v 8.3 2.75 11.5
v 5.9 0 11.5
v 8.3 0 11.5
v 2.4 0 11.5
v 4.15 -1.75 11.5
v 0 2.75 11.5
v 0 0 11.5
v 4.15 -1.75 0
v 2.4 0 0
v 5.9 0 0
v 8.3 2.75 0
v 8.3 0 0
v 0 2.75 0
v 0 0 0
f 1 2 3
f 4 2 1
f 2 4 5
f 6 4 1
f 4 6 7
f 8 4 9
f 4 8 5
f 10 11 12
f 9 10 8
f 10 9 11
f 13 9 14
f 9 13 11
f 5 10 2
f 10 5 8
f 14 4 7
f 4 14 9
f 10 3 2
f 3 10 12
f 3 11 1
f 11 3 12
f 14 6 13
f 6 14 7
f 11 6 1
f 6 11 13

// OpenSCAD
tubeLength=26;
vDiameter=10;

baseHeight=11.50;
baseWidth=8.30;
baseDepth=2.75;

union(){
    cube([baseWidth, baseDepth, baseHeight]);

    difference() {
        translate([baseWidth/2, -1.75, 0])
            rotate([0, 0, 45])
                cube([baseHeight, baseHeight, baseHeight]);
        
        translate([-baseWidth/2, 0, -1])
            cube([baseWidth*2, baseDepth*10, baseHeight+2]);
    }
}
